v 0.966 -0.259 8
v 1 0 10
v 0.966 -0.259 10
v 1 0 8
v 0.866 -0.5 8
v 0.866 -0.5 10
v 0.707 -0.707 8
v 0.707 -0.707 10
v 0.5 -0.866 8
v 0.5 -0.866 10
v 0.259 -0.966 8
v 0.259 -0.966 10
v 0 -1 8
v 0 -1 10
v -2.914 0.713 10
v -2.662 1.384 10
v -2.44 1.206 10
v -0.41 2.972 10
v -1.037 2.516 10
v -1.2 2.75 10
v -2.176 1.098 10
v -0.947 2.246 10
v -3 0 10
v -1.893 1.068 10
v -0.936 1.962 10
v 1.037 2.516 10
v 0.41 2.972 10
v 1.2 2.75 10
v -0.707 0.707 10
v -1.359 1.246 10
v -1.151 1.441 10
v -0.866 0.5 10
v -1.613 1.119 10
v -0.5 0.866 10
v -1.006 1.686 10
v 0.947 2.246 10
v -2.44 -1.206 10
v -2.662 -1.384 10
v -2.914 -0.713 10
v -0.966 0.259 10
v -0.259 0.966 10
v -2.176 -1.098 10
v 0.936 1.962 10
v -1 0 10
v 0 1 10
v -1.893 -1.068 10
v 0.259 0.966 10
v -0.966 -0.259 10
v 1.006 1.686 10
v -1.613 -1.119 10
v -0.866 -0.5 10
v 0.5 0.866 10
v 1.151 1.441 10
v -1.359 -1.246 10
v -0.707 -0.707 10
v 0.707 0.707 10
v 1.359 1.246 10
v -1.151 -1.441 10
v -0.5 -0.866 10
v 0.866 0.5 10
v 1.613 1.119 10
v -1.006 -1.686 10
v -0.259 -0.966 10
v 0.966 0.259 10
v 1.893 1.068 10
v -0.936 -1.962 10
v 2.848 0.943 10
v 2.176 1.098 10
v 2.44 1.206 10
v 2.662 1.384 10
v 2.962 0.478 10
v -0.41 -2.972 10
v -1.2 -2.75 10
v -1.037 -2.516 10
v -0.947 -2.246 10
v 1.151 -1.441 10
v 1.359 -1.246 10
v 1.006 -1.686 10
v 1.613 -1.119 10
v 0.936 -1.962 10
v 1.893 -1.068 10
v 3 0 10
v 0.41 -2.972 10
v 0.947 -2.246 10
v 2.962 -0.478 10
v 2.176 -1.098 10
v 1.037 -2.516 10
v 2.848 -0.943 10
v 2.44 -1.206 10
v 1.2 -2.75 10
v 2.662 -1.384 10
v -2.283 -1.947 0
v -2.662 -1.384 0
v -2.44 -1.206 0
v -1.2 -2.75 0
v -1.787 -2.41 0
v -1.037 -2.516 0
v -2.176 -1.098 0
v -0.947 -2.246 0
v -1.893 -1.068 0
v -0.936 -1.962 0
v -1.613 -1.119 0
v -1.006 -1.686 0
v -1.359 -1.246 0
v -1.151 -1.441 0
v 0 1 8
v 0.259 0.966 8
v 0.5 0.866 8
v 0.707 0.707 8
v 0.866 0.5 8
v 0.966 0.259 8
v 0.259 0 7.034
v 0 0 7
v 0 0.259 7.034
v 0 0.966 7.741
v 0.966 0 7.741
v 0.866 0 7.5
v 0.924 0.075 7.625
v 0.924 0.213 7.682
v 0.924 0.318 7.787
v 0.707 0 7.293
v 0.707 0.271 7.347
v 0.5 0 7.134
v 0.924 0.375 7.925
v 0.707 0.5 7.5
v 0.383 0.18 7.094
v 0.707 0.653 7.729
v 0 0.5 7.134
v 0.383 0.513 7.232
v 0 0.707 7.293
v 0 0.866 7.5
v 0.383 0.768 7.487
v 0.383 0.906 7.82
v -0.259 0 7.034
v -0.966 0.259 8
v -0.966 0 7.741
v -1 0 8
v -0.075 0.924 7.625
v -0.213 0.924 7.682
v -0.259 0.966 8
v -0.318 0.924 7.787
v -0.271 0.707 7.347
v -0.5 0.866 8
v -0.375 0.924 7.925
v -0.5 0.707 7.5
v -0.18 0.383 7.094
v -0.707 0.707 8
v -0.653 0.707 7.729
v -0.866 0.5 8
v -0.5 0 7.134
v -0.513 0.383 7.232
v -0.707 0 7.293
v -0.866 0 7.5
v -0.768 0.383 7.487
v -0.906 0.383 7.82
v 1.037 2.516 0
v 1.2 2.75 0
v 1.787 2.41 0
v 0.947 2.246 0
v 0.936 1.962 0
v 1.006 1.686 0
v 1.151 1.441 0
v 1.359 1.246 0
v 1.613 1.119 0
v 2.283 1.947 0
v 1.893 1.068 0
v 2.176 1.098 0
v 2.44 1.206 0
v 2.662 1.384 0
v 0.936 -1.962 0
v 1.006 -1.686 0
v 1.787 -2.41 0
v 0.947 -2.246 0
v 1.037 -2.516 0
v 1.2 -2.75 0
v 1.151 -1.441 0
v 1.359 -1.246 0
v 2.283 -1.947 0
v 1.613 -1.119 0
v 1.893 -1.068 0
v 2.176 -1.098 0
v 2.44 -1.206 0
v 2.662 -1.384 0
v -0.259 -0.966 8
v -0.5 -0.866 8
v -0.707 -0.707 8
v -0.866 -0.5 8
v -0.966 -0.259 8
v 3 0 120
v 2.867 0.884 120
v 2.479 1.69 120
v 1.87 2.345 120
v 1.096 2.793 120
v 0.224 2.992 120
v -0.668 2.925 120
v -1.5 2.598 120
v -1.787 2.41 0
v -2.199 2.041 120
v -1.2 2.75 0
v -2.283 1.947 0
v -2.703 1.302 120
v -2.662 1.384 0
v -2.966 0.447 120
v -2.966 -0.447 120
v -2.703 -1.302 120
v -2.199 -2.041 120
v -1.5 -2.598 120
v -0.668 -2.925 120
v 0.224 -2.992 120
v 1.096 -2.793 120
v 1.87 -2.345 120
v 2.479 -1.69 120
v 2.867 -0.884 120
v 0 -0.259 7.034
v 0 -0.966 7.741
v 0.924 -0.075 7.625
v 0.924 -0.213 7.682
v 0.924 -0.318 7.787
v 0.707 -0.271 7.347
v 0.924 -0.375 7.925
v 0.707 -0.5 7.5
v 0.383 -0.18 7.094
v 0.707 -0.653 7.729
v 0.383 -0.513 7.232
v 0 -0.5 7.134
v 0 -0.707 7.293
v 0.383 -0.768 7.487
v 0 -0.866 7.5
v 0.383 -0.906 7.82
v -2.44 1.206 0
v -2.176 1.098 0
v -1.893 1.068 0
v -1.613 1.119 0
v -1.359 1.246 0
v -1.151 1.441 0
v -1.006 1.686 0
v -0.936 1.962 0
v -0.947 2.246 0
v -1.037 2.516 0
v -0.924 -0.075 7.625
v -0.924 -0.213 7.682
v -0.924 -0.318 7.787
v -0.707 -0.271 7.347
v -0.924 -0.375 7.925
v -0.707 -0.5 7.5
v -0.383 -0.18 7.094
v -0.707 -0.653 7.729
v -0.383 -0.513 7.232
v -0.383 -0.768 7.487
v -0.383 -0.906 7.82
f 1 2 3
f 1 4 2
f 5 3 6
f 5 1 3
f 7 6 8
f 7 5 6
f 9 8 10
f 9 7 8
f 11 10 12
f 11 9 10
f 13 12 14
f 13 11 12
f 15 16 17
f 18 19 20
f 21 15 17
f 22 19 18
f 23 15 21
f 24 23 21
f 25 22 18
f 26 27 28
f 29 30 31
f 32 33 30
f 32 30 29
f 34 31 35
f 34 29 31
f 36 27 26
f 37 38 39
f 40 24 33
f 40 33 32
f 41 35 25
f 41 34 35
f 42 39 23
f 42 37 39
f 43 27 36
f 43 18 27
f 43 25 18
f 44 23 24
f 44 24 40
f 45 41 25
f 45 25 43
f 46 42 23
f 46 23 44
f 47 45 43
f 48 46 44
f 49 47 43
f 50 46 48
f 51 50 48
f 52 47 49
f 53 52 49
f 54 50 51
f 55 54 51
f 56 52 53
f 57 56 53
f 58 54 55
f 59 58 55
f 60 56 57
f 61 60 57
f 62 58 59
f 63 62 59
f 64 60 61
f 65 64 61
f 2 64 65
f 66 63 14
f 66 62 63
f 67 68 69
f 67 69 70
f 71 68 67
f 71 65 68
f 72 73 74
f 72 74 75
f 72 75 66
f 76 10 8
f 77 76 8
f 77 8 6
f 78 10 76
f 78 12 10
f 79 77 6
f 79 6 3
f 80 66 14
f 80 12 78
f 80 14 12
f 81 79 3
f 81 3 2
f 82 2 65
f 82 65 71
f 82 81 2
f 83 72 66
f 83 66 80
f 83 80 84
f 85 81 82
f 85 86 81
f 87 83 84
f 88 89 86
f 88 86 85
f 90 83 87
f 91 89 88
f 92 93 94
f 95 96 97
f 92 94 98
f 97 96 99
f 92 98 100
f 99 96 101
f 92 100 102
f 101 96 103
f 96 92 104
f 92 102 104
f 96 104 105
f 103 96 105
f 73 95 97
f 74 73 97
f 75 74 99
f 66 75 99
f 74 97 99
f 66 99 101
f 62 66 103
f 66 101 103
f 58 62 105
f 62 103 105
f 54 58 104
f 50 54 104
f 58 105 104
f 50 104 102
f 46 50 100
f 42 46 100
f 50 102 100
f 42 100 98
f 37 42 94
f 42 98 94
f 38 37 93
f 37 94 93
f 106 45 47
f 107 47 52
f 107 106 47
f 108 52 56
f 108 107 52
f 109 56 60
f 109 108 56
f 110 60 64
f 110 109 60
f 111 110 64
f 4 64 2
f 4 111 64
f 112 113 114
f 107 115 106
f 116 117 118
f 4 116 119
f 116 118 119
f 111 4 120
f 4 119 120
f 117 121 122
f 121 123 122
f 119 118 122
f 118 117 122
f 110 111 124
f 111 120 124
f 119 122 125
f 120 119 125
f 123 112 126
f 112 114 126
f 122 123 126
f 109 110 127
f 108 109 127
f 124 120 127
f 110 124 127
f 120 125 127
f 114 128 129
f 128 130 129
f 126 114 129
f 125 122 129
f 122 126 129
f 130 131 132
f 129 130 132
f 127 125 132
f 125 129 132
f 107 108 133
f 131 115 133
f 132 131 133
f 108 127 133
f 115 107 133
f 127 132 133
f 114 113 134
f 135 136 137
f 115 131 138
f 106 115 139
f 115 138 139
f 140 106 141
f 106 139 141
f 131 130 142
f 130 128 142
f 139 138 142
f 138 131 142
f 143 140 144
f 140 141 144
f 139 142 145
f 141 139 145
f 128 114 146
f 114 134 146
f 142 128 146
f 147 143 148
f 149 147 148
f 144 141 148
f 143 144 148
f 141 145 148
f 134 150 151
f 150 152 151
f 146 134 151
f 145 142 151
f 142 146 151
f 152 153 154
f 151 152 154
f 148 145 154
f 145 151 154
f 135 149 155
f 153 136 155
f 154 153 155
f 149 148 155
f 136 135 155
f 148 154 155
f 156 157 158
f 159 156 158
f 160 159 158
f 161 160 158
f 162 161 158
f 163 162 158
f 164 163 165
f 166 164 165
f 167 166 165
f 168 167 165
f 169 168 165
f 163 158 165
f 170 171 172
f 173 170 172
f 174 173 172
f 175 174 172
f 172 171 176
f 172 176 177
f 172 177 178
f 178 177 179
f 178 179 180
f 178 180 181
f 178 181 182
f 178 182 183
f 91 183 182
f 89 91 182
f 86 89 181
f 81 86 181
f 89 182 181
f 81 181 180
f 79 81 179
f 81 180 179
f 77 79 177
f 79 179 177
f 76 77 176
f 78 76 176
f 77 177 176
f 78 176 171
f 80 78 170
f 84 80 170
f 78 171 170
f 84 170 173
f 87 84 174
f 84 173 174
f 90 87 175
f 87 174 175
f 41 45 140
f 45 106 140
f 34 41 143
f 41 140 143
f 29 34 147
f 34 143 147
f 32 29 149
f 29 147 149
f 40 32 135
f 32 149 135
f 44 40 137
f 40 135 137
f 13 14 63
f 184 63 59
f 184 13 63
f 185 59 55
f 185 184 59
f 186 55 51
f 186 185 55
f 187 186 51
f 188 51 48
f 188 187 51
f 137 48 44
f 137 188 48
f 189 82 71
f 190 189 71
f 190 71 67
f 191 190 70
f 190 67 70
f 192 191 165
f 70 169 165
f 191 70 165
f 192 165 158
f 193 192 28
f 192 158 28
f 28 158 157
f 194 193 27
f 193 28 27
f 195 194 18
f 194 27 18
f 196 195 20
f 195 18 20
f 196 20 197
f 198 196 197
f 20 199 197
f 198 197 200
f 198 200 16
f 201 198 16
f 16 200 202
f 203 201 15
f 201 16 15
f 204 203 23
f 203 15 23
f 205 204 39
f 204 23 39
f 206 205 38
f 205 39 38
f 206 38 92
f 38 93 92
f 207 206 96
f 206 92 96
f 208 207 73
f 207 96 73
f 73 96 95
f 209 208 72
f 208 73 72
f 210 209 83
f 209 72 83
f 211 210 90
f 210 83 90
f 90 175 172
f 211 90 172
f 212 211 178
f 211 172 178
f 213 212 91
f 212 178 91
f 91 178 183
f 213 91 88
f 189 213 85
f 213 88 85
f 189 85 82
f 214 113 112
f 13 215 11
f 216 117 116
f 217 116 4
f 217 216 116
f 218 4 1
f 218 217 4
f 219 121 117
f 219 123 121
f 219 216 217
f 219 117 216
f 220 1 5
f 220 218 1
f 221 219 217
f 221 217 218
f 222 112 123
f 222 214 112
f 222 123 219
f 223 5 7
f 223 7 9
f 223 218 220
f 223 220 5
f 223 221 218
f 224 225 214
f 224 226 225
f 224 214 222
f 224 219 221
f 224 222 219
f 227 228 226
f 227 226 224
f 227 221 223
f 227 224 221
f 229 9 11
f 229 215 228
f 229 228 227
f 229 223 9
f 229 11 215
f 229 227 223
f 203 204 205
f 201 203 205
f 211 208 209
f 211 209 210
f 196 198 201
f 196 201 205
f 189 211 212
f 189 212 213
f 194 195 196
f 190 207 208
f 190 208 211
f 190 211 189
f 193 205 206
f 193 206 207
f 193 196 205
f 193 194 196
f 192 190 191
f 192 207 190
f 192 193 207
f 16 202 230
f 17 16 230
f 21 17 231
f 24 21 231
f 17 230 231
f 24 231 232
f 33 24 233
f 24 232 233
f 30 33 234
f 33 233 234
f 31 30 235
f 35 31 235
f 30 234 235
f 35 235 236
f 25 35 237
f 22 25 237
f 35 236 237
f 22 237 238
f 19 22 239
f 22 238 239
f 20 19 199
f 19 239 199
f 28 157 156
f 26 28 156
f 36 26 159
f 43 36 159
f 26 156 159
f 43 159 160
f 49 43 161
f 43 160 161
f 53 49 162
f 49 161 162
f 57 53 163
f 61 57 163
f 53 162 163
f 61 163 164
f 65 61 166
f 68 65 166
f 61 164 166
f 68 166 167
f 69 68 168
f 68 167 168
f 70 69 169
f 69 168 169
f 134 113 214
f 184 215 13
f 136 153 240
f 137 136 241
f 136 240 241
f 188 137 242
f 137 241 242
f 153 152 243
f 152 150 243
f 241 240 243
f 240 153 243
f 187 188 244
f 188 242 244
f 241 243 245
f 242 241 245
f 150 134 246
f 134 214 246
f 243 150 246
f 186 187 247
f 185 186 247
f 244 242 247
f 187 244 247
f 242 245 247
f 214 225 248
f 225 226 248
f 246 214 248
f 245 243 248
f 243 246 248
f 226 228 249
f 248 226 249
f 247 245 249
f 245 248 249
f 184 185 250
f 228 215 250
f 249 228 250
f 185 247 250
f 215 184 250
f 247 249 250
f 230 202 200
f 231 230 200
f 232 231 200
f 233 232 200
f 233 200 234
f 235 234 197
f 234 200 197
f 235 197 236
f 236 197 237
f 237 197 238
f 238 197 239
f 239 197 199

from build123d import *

# Parameters (mm, degrees)
F0_R     = 3
F1_DEPTH = 120
F3_DEPTH = 10
F4_W     = 2
F4_H     = 2
F5_DEPTH = 3
F6_R     = 0.99999


# Not quite as in the source:
# - a fillet or chamfer is up to 0.001 mm smaller than in the source, because OpenCascade refuses the exact size


with BuildPart() as f1:
    # F0 (on Top) → F1 (new body)
    with BuildSketch(Plane.XY):
        Circle(F0_R)
    extrude(amount=F1_DEPTH)

    # F2 (on face) → F3 (cut)
    with BuildSketch(Plane(origin=(0, 0, 0), x_dir=(1, 0, 0), z_dir=(0, 0, -1))):
        with BuildLine():
            ThreePointArc((-1.2, 2.749545417), (-1.2481367635, 1.3361513276), (-2.6615308529, 1.384288091))
            ThreePointArc((-2.6615308529, 1.384288091), (-3, 0), (-2.6615308529, -1.384288091))
            ThreePointArc((-2.6615308529, -1.384288091), (-1.2481367635, -1.3361513276), (-1.2, -2.749545417))
            ThreePointArc((-1.2, -2.749545417), (0, -3), (1.2, -2.749545417))
            ThreePointArc((1.2, -2.749545417), (1.2481367635, -1.3361513276), (2.6615308529, -1.384288091))
            ThreePointArc((2.6615308529, -1.384288091), (2.9141544707, -0.7125333119), (3, 0))
            ThreePointArc((3, 0), (2.9141544707, 0.7125333119), (2.6615308529, 1.384288091))
            ThreePointArc((2.6615308529, 1.384288091), (1.2481367635, 1.3361513276), (1.2, 2.749545417))
            ThreePointArc((1.2, 2.749545417), (0, 3), (-1.2, 2.749545417))
        make_face()
    extrude(amount=-F3_DEPTH, mode=Mode.SUBTRACT)

    # F4 (on face) → F5 (join)
    with BuildSketch(Plane(origin=(0, 0, 10), x_dir=(1, 0, 0), z_dir=(0, 0, -1))):
        Rectangle(F4_W, F4_H)
    extrude(amount=F5_DEPTH)

    # F6 (radius 1 in the source; OpenCascade refuses exactly that, so slightly less here)
    f6_edges = [f1.edges().sort_by_distance(p)[0] for p in [
        (0, -1, 7),
        (-1, 0, 7),
        (0, 1, 7),
        (1, 0, 7),
        (1, -1, 8.5),
        (1, 1, 8.5),
        (-1, -1, 8.5),
        (-1, 1, 8.5),
    ]]
    fillet(f6_edges, radius=F6_R)


solid = f1.part
